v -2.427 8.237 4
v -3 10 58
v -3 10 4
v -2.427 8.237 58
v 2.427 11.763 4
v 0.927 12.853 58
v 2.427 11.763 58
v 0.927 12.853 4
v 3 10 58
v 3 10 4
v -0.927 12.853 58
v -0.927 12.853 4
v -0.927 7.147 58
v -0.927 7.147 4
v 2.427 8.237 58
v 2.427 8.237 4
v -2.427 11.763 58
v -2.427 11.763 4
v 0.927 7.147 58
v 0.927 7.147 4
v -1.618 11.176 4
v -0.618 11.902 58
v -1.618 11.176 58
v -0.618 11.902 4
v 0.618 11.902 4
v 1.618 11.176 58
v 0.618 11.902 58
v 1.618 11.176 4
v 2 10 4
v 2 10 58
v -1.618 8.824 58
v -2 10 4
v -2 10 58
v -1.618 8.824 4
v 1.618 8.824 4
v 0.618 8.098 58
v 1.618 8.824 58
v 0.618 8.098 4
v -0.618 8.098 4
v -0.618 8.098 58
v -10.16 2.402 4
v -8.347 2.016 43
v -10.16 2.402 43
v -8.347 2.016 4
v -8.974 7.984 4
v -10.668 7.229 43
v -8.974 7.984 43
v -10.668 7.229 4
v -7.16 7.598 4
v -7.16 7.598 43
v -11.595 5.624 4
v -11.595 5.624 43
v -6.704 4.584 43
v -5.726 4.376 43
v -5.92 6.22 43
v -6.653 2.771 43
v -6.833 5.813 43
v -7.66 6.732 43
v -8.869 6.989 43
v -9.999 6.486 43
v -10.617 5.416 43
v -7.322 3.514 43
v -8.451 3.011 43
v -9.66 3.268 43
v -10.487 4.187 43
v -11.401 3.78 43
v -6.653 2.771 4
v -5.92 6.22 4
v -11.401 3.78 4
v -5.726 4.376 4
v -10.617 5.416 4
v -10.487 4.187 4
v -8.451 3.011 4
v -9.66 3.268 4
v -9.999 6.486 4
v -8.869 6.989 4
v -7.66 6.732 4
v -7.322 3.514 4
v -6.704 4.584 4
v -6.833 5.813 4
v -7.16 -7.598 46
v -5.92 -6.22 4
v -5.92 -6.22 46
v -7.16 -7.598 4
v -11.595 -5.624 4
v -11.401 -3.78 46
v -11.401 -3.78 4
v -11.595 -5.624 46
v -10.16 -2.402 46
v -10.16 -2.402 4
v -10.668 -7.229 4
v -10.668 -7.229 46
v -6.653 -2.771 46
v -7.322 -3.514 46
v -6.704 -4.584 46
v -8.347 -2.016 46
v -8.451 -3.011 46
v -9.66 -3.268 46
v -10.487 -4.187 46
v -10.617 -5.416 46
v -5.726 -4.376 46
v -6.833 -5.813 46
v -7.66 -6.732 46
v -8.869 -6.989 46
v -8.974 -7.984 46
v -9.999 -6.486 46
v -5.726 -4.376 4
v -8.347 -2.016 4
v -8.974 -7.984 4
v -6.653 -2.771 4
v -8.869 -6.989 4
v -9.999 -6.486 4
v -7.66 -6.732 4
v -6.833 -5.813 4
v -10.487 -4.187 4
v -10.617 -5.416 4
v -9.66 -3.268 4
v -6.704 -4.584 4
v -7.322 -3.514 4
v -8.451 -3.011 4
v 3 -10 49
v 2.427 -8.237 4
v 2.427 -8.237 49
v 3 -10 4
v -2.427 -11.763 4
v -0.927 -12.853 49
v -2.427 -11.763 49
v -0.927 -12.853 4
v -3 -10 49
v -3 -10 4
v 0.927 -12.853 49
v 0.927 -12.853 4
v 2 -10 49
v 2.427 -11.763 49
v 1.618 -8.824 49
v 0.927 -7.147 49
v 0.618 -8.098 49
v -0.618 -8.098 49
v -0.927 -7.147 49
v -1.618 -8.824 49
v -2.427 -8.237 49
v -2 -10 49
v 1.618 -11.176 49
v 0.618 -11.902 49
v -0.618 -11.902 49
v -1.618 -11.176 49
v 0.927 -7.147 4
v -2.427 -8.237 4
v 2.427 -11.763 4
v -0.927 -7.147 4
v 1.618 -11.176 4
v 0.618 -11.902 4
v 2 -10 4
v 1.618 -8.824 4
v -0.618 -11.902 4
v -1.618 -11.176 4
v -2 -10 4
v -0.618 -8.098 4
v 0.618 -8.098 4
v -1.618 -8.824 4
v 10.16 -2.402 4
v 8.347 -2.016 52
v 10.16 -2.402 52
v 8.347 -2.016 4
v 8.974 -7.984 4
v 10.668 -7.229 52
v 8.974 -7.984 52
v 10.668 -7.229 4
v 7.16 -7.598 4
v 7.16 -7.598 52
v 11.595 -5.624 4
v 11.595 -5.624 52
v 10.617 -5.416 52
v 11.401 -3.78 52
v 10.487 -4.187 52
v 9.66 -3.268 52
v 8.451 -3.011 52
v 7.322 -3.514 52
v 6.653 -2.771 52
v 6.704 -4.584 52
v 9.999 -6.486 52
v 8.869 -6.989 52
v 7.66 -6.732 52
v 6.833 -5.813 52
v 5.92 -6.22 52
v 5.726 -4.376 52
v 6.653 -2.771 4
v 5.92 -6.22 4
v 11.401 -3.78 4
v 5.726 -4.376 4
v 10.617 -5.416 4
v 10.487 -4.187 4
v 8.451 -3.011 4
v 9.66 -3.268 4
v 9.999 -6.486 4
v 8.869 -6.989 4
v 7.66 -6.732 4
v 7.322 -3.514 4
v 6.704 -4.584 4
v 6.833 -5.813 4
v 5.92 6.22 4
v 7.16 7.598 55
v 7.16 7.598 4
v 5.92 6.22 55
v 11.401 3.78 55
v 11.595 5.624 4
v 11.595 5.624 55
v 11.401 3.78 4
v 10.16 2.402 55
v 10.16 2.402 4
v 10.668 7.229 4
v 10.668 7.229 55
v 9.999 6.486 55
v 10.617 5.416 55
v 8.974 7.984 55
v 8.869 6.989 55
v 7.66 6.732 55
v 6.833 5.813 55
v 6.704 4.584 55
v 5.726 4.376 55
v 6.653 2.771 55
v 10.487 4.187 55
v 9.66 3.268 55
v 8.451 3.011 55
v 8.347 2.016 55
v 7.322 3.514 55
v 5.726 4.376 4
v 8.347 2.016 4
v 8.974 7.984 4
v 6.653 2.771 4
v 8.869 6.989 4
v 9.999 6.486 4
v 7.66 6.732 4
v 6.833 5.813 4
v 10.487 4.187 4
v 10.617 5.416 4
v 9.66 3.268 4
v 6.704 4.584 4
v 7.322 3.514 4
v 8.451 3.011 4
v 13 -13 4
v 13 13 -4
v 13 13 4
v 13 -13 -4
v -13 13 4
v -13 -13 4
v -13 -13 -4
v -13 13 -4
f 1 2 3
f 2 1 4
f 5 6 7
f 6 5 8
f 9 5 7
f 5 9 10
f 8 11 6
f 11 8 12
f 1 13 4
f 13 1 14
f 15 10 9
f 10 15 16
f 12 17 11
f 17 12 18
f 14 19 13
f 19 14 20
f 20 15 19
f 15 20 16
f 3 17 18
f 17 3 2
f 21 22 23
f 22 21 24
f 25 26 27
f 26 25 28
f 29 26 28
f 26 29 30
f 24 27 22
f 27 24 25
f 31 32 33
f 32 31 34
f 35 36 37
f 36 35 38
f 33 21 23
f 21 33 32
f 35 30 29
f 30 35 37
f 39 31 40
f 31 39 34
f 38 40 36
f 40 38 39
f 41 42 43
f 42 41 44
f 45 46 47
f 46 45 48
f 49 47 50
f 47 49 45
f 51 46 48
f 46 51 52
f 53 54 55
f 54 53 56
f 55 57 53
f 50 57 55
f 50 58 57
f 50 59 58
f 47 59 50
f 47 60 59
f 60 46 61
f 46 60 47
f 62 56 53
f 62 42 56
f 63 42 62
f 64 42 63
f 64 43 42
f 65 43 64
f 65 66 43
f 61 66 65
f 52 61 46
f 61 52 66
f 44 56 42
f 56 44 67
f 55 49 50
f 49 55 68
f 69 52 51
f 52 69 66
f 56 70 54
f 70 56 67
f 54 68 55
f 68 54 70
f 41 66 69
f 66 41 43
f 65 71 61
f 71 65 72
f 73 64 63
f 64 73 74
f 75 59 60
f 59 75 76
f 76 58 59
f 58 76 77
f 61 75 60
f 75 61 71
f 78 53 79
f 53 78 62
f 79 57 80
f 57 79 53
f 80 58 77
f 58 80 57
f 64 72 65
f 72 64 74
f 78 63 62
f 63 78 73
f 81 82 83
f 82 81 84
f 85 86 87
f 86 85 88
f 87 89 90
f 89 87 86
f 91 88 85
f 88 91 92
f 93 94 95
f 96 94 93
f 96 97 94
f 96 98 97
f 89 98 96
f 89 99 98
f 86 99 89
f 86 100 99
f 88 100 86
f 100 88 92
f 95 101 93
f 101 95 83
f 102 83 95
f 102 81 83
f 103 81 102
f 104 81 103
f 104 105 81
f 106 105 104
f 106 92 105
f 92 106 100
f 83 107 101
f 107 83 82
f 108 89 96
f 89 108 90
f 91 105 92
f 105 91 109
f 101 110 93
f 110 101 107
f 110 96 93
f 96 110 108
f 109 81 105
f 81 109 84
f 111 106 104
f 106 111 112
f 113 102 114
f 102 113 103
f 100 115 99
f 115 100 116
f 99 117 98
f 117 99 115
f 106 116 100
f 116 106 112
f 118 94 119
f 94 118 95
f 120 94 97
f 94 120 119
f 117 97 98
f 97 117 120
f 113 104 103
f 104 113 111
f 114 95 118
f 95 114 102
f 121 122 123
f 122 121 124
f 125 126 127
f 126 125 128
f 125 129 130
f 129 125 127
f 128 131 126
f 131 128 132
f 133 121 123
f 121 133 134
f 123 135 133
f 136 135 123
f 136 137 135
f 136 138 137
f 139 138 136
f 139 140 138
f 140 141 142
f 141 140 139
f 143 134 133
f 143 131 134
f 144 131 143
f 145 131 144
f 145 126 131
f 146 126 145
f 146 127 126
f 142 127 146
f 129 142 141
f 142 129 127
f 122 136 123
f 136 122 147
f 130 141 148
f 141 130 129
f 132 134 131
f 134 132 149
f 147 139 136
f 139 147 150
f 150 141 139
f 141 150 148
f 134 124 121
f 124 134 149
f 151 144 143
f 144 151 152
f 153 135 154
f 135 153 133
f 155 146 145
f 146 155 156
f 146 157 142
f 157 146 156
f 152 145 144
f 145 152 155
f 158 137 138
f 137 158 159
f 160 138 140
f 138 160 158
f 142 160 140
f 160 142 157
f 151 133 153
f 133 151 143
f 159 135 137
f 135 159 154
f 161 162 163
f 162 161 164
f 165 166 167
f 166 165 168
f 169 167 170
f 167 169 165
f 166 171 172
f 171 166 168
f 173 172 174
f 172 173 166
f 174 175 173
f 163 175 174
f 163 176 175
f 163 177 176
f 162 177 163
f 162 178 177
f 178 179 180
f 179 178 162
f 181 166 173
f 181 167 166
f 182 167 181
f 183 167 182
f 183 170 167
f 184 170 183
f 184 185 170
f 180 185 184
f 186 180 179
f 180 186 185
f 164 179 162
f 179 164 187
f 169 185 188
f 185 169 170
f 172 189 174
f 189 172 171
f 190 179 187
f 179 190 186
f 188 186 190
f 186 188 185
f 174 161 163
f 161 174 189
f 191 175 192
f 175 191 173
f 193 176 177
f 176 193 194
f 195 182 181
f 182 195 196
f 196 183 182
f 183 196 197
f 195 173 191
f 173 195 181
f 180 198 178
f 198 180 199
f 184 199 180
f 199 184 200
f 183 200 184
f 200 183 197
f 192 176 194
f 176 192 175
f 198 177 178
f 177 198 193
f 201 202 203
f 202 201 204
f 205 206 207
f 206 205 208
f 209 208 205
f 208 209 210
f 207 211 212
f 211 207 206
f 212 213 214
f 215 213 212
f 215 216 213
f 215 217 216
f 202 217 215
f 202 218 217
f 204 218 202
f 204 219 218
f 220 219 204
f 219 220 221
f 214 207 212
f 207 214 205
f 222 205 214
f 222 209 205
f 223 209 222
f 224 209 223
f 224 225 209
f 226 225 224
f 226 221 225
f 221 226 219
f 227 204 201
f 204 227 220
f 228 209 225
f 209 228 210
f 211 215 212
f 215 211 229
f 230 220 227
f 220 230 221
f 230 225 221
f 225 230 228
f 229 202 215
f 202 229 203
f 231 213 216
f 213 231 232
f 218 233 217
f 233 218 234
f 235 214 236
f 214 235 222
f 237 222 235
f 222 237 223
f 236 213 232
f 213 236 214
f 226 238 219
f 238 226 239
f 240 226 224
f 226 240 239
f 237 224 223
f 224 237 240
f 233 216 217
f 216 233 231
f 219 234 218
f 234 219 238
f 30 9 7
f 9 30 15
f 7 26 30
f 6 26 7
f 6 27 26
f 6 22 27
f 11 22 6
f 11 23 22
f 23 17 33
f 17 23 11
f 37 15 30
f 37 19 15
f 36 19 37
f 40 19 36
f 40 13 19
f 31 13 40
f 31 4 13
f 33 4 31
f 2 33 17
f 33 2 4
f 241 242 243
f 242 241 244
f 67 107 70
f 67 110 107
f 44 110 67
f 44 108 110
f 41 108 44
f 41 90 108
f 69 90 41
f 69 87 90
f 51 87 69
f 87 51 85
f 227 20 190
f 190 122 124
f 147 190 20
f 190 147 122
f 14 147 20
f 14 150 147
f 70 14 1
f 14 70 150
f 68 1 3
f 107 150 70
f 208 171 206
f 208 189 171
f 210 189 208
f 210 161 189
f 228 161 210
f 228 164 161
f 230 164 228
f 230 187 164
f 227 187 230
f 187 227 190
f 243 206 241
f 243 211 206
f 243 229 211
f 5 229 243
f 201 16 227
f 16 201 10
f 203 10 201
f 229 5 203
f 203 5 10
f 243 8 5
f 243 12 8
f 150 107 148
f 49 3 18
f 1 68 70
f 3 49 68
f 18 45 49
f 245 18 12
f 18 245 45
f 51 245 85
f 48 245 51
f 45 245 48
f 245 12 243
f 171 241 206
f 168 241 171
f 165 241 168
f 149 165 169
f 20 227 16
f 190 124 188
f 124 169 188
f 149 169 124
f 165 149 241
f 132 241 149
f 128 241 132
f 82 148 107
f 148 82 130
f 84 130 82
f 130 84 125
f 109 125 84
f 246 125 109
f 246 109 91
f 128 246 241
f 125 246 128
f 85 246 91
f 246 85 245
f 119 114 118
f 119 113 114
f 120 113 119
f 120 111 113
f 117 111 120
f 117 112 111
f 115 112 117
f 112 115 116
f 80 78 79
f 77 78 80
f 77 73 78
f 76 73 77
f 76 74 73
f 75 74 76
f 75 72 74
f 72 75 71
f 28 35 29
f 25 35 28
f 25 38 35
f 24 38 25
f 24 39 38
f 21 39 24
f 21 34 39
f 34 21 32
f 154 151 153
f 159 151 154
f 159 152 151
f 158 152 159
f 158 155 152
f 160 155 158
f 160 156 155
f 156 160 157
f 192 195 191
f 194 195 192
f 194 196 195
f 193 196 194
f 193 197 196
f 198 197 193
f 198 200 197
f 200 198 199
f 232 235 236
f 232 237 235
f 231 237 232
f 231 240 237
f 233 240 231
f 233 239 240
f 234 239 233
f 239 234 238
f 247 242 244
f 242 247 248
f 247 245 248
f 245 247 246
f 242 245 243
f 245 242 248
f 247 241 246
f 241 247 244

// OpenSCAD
cube([26,26,8],center=true);
for ( i = [0 : 6] )
{
    rotate( i * 360 / 6,[0,0,1])
    translate([0, 10, 0])
    difference(){
      cylinder(r = 3,h=i*3+40,$fn=10);
      cylinder(r = 3-1,h=i*3+40+1,$fn=10);
  }
}
